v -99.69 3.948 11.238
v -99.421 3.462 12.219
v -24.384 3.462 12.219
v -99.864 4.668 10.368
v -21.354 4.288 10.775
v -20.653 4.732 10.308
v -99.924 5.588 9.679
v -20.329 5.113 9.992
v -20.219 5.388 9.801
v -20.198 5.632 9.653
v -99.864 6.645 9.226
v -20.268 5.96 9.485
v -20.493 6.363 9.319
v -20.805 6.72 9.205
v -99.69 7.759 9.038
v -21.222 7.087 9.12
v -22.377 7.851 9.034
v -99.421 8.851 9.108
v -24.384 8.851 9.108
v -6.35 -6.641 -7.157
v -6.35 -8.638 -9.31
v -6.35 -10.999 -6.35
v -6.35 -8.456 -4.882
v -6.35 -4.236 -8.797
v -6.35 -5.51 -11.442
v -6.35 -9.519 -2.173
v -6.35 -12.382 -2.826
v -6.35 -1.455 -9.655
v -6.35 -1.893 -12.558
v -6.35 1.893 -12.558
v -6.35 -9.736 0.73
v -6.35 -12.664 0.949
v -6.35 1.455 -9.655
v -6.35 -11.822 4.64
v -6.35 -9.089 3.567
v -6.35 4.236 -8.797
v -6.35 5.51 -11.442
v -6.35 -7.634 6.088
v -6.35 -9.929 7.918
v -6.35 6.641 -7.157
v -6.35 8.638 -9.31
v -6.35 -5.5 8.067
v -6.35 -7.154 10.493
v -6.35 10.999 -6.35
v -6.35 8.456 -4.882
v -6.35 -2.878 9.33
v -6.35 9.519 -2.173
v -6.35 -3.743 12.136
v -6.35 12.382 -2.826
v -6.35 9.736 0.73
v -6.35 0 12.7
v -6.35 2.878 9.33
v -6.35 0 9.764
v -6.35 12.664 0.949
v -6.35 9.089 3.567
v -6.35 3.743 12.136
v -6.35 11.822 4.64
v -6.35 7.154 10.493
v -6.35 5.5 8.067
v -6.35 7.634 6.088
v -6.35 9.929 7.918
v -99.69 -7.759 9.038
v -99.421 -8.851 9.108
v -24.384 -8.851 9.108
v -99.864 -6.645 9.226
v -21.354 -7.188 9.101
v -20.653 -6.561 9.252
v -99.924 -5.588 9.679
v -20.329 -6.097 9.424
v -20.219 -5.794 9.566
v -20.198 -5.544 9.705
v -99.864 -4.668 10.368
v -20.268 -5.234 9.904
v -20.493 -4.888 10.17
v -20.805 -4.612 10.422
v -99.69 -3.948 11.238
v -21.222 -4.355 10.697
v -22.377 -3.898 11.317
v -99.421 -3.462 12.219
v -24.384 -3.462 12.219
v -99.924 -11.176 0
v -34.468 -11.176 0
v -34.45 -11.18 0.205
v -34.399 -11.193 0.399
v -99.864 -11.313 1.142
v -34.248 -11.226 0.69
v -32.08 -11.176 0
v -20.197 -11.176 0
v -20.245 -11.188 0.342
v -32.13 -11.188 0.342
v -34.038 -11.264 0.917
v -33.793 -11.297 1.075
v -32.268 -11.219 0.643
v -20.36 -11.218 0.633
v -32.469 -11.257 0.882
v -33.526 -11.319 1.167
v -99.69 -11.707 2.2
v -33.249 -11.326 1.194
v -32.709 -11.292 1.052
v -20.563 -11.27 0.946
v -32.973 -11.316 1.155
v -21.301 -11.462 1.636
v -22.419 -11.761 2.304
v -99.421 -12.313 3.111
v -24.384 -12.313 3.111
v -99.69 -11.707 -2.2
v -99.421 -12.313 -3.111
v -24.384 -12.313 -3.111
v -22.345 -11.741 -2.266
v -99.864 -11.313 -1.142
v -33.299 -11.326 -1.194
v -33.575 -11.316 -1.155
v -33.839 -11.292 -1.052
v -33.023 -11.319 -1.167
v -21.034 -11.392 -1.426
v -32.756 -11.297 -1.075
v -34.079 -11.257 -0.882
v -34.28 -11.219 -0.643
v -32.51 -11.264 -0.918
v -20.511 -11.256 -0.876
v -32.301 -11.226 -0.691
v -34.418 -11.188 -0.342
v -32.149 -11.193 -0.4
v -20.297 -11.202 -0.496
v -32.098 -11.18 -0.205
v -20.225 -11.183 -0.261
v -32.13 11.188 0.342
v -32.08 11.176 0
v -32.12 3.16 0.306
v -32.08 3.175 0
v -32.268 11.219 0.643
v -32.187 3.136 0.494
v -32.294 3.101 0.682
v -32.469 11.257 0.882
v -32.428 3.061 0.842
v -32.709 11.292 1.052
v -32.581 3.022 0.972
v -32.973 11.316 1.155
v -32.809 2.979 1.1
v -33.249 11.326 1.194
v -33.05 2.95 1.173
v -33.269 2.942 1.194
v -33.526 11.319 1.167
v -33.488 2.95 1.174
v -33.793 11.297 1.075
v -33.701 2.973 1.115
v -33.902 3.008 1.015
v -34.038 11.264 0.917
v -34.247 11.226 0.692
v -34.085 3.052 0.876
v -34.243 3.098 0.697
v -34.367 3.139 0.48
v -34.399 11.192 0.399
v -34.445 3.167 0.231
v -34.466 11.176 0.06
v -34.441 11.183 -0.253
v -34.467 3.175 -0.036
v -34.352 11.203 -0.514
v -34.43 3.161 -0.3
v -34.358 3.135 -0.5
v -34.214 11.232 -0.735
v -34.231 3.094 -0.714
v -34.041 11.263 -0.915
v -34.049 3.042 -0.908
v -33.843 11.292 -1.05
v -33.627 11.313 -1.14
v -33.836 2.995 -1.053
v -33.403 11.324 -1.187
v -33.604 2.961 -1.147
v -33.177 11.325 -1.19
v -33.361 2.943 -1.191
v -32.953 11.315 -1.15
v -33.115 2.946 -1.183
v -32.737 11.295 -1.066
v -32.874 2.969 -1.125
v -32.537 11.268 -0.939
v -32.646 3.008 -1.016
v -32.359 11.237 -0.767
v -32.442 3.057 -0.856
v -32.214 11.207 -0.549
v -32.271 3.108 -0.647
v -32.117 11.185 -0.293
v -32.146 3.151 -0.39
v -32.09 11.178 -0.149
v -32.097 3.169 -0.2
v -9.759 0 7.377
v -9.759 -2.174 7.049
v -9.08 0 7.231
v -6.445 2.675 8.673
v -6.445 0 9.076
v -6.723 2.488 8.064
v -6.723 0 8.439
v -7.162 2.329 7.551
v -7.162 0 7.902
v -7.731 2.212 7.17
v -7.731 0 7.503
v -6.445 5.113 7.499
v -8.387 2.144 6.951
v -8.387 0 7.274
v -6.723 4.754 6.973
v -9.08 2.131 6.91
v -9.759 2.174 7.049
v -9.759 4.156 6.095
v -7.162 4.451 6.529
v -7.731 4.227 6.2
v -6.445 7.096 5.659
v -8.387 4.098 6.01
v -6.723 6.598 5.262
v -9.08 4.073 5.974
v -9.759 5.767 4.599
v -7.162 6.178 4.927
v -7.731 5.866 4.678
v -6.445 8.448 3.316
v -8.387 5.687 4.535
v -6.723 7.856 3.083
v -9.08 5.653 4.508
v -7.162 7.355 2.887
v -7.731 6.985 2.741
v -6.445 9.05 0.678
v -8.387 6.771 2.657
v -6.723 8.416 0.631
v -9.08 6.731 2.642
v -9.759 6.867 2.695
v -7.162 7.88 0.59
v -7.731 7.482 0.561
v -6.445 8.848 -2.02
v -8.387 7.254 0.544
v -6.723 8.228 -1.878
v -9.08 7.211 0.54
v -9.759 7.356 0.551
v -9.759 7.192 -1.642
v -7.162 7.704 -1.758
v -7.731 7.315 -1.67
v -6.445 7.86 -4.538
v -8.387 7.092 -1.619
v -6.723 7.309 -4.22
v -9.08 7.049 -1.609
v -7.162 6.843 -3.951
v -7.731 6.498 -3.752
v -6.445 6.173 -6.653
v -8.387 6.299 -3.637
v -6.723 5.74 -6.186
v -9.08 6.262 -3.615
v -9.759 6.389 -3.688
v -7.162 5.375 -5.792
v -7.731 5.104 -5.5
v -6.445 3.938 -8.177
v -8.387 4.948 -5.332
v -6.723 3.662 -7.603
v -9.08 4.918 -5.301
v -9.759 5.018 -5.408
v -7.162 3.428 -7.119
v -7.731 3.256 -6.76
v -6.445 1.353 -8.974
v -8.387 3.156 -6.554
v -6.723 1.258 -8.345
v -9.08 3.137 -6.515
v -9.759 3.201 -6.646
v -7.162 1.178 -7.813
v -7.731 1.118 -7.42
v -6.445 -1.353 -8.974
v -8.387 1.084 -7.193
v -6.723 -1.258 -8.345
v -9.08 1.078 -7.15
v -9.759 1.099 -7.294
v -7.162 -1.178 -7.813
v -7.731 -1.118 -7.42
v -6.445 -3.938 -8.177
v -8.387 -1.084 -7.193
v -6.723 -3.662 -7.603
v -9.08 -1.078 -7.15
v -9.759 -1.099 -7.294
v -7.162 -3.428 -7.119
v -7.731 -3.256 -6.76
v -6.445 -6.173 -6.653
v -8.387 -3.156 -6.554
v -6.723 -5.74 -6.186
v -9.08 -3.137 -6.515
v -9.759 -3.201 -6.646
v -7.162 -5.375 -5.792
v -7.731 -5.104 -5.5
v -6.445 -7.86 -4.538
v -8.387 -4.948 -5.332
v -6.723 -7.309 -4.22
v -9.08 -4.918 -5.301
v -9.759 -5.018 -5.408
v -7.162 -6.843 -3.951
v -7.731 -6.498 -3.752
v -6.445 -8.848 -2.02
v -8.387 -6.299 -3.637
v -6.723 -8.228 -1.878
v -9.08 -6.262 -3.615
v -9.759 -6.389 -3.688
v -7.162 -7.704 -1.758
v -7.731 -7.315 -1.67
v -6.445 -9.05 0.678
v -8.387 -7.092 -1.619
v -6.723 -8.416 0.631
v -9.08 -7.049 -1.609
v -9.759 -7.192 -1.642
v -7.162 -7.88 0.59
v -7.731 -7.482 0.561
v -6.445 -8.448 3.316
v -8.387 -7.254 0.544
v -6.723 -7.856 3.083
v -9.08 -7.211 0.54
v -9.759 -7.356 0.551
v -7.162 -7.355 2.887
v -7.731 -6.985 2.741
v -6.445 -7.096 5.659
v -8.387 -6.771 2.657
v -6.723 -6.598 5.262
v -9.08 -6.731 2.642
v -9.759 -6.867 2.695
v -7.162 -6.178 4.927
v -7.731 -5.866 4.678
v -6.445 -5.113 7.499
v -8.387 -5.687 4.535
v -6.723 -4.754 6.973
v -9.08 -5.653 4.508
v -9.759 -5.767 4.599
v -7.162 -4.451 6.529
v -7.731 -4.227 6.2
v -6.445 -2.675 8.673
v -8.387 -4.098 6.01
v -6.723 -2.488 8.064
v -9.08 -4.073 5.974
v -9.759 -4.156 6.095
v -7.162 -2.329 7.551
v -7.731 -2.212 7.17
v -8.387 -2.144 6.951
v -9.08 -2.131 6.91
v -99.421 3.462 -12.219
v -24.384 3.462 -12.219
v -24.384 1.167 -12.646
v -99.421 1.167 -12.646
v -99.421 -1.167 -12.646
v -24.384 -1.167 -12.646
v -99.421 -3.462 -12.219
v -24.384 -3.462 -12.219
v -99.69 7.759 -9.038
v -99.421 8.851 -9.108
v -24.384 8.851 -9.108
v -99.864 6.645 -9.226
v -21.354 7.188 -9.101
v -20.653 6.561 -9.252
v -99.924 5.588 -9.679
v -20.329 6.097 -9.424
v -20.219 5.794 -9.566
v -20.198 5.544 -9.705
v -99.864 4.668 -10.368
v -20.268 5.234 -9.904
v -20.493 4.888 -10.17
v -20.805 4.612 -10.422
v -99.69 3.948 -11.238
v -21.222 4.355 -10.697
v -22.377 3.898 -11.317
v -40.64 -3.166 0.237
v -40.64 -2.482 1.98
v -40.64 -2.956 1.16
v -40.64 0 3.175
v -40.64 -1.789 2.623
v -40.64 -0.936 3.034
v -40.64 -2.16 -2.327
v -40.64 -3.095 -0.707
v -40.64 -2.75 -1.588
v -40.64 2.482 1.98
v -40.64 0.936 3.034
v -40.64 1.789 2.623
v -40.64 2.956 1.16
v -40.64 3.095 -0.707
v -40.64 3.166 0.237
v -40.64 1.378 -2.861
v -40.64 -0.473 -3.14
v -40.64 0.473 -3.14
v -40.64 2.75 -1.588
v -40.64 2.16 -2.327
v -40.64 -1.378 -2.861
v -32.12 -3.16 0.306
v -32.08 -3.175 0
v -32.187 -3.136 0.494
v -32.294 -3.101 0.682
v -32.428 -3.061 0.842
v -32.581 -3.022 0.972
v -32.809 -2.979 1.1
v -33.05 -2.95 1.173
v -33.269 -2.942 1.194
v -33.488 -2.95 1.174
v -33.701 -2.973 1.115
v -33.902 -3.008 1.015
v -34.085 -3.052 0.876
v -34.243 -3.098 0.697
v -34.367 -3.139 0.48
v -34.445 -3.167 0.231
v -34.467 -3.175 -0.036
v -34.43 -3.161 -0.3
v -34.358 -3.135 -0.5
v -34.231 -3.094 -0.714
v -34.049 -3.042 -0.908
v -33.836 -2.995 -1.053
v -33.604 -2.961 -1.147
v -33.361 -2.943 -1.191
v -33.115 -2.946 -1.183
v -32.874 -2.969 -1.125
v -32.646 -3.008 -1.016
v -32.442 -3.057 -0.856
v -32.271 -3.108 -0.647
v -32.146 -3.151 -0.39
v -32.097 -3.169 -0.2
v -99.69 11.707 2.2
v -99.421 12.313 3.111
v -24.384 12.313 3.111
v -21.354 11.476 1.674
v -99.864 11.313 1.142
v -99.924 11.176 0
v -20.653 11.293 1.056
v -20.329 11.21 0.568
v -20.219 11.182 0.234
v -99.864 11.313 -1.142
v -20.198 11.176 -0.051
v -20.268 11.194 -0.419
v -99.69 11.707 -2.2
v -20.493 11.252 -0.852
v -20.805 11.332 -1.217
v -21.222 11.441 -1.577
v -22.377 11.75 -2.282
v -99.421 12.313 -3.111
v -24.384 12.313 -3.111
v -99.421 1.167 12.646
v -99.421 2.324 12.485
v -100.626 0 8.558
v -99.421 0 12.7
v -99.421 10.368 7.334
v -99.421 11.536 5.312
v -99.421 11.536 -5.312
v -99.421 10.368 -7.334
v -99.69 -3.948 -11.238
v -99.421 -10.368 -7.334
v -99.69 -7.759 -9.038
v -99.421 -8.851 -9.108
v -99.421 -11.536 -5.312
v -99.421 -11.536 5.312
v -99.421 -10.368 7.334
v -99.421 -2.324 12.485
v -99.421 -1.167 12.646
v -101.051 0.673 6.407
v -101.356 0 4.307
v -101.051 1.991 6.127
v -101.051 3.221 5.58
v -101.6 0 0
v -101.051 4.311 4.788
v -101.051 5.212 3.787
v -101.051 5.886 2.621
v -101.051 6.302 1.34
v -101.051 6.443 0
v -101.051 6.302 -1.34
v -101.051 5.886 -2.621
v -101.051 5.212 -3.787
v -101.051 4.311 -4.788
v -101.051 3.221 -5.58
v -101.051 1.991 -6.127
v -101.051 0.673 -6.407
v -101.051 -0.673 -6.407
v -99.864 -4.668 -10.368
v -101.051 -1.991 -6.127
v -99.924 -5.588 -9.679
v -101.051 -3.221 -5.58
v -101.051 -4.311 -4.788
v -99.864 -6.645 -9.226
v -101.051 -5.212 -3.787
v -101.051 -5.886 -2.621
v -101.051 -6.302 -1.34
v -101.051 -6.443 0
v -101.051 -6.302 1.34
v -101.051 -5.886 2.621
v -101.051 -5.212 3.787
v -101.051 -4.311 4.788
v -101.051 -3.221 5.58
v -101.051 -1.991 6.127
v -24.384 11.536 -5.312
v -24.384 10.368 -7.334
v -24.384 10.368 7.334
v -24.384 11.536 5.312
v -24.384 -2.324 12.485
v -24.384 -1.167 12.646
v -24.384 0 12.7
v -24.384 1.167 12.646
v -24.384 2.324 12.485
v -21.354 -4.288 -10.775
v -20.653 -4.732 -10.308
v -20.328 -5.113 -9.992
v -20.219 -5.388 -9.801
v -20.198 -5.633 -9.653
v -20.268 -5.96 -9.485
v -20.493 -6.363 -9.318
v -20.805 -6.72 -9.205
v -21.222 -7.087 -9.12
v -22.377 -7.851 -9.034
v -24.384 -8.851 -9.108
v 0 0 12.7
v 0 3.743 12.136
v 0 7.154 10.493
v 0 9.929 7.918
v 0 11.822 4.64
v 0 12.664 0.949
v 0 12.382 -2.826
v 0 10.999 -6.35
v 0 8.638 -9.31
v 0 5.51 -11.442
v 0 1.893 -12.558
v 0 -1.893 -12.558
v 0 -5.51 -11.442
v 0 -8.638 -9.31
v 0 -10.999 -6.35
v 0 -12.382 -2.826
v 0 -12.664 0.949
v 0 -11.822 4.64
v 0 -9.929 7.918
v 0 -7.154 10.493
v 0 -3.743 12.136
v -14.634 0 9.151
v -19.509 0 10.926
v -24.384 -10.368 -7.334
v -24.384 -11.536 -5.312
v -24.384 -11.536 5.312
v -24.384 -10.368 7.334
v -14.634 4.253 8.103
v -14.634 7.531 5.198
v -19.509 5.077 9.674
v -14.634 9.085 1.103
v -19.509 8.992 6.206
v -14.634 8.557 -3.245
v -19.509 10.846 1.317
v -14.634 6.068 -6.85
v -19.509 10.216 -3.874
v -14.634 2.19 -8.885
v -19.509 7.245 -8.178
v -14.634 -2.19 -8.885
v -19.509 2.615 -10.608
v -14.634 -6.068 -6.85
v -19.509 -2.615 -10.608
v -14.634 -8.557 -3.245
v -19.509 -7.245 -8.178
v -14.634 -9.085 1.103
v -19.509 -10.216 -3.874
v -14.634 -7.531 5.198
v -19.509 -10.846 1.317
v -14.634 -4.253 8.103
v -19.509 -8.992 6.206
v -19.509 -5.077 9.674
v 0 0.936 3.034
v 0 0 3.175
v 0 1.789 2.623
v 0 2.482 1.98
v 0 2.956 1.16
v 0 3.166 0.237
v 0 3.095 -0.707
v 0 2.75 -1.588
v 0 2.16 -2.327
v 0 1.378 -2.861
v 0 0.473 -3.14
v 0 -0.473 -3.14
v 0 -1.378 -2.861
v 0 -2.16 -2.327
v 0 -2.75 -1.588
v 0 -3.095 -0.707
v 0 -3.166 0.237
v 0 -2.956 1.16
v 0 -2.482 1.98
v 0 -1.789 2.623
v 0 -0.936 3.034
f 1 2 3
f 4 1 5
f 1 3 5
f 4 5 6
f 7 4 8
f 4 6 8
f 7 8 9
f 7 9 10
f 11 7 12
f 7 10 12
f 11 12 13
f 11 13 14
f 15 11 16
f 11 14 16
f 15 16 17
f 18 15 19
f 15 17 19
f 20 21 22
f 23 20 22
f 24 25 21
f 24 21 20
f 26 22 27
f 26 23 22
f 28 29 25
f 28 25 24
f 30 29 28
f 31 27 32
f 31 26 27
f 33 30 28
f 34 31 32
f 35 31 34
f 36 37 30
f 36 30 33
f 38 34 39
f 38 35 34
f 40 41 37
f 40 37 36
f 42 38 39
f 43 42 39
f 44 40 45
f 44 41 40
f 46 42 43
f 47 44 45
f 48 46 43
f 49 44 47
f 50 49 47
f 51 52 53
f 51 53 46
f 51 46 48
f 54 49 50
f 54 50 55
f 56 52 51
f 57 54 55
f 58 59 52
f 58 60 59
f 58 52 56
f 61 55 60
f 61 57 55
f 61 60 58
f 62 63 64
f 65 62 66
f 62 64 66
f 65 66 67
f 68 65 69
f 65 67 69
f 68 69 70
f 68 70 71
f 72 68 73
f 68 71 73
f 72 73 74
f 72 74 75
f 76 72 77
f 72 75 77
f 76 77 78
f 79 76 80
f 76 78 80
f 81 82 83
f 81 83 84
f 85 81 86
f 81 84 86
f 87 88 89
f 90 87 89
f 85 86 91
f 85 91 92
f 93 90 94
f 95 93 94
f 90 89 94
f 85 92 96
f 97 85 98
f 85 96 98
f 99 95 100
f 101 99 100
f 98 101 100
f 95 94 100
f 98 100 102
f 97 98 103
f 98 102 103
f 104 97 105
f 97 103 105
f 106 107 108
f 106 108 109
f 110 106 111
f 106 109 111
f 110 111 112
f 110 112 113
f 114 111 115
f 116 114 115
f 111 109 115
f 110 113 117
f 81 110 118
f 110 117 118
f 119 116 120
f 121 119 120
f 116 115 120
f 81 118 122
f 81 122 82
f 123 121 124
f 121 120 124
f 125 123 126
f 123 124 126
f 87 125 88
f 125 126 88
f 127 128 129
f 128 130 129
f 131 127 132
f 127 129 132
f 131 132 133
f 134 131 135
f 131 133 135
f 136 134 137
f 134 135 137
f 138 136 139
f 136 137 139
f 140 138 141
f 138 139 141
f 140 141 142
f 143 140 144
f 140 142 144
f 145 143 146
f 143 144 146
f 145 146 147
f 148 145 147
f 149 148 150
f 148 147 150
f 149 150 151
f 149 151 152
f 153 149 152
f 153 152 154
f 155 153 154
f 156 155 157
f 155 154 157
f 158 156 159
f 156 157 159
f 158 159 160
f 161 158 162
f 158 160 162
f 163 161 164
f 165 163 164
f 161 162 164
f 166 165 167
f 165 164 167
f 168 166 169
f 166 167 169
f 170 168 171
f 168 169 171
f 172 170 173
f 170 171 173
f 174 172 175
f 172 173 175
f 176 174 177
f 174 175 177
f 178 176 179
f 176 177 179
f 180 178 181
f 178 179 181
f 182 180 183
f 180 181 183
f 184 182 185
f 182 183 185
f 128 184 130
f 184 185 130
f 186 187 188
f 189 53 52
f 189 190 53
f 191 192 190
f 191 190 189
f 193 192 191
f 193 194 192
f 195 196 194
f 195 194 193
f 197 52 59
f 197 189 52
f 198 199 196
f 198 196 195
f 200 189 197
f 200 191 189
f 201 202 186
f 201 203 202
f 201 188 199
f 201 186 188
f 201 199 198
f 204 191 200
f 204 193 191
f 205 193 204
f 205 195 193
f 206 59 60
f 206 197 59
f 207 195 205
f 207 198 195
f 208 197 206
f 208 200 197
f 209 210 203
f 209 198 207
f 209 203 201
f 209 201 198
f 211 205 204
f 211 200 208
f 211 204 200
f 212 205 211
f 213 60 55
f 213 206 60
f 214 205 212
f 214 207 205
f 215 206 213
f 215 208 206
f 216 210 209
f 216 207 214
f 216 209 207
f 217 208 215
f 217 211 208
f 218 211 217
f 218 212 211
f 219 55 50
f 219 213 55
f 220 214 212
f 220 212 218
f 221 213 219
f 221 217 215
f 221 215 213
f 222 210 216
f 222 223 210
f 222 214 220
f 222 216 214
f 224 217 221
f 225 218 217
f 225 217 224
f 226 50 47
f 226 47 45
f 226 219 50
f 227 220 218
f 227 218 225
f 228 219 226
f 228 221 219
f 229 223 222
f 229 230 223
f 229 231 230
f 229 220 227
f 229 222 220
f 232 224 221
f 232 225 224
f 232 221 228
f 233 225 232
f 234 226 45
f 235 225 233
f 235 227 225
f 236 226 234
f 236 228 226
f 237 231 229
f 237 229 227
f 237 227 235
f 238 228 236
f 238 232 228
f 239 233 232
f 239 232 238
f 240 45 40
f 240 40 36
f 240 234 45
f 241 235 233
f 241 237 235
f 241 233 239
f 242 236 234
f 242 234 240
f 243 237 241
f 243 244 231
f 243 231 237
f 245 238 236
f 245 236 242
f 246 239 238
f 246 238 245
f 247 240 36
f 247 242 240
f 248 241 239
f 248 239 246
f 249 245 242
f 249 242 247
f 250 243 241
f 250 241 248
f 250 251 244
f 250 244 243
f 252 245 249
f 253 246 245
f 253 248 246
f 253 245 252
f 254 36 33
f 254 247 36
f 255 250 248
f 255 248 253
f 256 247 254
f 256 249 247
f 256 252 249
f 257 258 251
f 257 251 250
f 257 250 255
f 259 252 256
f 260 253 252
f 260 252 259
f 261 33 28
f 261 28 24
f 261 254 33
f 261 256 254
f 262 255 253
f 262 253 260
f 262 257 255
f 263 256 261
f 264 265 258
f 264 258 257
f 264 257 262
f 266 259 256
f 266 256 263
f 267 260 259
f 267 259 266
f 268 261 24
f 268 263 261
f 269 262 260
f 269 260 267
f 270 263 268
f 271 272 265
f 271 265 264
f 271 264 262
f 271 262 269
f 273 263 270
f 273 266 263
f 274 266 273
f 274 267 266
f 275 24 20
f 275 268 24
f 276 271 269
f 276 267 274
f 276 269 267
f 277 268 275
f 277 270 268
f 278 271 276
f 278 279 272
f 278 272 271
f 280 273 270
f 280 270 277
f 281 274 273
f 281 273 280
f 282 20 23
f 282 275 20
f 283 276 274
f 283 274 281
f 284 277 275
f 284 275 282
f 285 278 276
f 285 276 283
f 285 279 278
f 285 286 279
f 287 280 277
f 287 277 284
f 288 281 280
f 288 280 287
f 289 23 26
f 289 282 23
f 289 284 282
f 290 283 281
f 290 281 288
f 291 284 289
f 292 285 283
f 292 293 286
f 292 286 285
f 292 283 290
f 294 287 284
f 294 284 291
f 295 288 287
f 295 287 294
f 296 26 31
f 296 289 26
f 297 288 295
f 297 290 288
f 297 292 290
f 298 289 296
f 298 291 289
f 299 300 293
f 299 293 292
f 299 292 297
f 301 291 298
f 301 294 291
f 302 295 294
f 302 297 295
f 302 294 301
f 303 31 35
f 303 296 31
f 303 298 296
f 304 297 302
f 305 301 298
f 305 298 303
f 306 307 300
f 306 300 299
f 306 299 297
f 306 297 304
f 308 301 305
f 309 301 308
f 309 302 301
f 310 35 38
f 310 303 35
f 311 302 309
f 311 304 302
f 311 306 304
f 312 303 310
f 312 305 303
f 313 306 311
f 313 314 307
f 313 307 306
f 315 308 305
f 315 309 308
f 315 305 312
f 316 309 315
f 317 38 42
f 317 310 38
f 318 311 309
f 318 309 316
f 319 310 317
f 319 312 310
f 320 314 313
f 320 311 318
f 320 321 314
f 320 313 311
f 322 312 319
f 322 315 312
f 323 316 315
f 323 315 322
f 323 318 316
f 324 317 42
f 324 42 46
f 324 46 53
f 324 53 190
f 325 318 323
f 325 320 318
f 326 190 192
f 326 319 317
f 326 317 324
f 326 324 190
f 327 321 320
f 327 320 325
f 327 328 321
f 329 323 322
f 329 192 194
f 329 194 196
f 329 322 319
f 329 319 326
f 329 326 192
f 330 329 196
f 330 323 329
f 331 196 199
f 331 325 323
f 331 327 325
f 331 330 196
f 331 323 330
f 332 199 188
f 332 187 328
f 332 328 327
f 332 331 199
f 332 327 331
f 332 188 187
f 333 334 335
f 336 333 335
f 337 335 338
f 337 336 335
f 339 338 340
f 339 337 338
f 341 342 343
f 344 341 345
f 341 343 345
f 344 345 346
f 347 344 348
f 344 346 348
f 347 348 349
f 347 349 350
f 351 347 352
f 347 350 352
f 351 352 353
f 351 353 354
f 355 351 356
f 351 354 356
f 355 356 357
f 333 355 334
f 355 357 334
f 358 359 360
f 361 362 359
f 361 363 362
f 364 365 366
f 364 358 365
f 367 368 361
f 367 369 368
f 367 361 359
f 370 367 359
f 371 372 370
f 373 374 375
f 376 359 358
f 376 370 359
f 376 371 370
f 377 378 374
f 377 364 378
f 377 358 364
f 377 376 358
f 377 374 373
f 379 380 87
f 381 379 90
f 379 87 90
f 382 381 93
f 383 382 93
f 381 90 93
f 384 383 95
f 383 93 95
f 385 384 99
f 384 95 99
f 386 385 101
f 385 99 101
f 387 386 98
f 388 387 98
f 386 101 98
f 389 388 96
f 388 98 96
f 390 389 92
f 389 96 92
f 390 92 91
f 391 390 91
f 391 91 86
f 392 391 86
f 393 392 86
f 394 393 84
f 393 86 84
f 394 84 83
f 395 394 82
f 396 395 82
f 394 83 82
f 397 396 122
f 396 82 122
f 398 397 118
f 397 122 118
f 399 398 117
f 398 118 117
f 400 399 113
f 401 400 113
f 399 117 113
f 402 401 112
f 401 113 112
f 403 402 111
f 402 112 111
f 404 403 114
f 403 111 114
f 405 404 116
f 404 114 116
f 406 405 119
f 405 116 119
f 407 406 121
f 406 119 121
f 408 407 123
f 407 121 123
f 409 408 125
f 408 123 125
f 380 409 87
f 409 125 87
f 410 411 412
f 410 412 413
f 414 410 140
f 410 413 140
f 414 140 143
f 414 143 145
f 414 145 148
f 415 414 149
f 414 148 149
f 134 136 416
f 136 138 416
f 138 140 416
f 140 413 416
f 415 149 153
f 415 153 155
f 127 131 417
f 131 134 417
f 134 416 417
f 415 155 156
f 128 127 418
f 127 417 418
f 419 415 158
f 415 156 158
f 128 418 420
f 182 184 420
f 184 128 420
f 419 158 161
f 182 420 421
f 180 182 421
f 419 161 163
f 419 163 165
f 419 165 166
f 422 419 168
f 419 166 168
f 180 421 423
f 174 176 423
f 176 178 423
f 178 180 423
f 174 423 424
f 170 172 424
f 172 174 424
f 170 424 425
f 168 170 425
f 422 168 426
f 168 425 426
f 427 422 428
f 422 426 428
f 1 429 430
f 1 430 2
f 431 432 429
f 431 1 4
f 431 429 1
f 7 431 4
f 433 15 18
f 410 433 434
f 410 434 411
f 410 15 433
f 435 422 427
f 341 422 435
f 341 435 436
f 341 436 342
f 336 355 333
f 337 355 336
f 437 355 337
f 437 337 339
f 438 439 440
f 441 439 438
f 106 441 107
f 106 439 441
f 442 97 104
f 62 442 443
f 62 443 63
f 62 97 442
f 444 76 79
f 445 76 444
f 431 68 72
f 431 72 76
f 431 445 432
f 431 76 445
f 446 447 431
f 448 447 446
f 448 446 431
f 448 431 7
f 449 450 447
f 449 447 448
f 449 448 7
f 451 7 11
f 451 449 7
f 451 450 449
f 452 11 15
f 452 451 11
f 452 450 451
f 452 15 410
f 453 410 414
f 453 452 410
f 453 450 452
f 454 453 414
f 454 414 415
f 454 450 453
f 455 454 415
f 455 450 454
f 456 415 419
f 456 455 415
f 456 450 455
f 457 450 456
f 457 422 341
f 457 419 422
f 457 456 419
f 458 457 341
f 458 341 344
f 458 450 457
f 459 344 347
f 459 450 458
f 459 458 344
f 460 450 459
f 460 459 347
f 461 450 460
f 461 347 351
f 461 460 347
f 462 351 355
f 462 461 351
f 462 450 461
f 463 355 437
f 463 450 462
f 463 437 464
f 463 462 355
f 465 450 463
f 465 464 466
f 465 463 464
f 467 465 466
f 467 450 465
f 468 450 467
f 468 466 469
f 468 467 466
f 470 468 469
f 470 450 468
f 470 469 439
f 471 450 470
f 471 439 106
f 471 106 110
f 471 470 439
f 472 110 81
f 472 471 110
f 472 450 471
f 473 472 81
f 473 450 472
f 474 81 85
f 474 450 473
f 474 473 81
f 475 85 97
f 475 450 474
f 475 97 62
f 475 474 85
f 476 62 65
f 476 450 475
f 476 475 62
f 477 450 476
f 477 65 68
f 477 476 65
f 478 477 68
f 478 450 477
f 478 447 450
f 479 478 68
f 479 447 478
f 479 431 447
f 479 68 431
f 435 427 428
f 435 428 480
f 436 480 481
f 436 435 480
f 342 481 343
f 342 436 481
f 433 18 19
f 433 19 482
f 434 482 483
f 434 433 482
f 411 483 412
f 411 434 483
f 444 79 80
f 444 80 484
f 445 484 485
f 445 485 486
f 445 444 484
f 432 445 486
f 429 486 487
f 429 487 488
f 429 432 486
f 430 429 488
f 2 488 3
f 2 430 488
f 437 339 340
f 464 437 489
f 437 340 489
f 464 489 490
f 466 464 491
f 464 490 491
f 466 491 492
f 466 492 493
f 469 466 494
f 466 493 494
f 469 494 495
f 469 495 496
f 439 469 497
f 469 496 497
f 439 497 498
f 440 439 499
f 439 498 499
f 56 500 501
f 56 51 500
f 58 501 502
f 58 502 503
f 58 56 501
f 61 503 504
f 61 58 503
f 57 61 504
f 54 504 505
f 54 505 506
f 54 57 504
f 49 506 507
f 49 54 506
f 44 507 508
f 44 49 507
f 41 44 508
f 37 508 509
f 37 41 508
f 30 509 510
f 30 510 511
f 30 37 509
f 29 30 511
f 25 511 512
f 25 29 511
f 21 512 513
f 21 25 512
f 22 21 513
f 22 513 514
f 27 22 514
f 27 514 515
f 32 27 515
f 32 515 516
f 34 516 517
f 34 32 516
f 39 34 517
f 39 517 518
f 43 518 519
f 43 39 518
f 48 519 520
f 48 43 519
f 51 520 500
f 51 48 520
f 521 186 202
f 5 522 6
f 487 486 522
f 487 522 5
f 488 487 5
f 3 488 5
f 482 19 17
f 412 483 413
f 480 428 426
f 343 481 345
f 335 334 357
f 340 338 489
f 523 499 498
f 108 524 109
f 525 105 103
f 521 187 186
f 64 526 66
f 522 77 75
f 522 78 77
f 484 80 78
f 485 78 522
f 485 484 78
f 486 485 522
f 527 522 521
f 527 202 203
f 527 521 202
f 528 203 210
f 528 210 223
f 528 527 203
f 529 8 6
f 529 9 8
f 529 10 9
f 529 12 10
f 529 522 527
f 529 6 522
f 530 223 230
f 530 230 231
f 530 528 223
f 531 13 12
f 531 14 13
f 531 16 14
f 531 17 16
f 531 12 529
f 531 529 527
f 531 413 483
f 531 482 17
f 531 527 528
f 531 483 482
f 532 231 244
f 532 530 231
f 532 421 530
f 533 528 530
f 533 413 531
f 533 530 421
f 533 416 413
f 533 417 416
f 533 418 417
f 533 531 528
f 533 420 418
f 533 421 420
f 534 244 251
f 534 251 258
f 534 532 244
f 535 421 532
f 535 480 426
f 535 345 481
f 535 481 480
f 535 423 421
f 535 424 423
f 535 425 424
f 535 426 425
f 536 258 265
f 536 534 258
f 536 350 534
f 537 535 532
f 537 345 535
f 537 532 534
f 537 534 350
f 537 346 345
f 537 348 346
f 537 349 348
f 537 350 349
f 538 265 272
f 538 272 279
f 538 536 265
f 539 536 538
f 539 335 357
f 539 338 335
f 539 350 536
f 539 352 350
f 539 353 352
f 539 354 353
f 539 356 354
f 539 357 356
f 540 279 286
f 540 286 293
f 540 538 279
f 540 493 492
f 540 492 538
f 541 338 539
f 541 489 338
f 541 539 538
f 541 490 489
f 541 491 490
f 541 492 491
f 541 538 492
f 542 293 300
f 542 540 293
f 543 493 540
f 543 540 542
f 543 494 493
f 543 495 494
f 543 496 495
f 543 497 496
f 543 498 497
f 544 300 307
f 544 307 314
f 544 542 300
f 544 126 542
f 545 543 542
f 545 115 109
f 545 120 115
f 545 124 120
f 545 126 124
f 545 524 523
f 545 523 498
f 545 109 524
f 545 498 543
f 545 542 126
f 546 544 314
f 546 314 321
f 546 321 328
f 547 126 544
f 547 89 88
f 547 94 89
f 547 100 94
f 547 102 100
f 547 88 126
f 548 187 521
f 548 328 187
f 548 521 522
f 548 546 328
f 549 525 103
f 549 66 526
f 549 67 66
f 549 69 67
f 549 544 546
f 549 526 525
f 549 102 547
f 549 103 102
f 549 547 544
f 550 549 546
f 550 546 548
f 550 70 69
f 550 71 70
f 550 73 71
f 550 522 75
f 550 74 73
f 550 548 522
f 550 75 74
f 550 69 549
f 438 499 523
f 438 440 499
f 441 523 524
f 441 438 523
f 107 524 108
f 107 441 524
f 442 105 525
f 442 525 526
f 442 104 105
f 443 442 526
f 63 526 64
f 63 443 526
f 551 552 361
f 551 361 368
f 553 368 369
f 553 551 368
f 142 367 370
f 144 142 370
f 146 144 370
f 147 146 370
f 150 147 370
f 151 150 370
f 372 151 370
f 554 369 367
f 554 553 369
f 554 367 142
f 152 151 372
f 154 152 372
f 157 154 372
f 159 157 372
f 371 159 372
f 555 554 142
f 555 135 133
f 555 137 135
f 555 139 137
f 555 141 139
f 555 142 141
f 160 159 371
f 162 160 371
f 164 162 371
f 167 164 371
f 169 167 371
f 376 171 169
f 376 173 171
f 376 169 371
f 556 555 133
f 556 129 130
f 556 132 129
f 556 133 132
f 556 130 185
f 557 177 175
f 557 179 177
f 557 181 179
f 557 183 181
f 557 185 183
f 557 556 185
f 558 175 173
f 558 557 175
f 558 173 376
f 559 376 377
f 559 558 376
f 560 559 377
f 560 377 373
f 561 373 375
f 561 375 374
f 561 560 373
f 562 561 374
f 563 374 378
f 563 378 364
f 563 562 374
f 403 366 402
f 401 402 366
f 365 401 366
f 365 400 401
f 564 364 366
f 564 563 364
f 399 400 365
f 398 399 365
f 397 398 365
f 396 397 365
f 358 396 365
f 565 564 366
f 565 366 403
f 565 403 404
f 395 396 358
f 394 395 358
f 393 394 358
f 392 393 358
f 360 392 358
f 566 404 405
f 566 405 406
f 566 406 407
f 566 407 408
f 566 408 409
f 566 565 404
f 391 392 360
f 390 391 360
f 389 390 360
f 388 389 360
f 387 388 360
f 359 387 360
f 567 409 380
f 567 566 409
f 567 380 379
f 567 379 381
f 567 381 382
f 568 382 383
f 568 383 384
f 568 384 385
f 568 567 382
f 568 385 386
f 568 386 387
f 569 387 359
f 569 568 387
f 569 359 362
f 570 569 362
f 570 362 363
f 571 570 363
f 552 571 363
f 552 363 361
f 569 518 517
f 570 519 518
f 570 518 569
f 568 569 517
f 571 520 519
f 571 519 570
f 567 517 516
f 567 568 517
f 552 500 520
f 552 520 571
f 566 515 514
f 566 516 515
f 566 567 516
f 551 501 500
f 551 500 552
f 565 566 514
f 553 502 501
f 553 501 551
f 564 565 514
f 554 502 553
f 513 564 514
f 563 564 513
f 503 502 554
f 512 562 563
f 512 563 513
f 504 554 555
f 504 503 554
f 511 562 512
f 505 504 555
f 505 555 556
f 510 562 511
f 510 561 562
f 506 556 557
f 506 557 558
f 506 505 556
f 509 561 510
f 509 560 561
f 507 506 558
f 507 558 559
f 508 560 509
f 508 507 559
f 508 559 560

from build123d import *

# Parameters (mm, degrees)
F4_START = -7.62
F4_DEPTH = 93.981
F5_R     = 1.1938
F6_DEPTH = 12.7


with BuildPart() as f1:
    # F0 (on Front) → F1 (revolve)
    with BuildSketch(Plane.XZ):
        with BuildLine():
            Line((-40.64, 3.175), (0, 3.175))
            Line((0, 3.175), (0, 12.7))
            Line((0, 12.7), (-6.35, 12.7))
            Line((-6.35, 12.7), (-6.35, 9.7636567324))
            ThreePointArc((-6.35, 9.7636567324), (-7.4331158517, 7.6830105399), (-9.758731164, 7.3768374756))
            Line((-9.758731164, 7.3768374756), (-24.384, 12.7))
            Line((-24.384, 12.7), (-99.4210244843, 12.7))
            ThreePointArc((-99.4210244843, 12.7), (-101.0513051228, 6.4427853895), (-101.6, 0))
            Line((-101.6, 0), (-40.64, 0))
            Line((-40.64, 0), (-40.64, 3.175))
        make_face()
    revolve(axis=Axis((-71.12, 0, 0), (-1, 0, 0)))

    # F2 (on Right) → F4 (cut)
    with BuildSketch(Plane.YZ.offset(F4_START)):
        with BuildLine():
            ThreePointArc((-3.175, 13.8581385114), (-3.2583413998, 14.751147695), (-3.5054871123, 15.6133136811))
            ThreePointArc((-3.5054871123, 15.6133136811), (-8.001, 13.8581385114), (-11.768782729, 10.8424977325))
            ThreePointArc((-11.768782729, 10.8424977325), (-6.4030393387, 9.3043710903), (-3.175, 13.8581385114))
        make_face()
        with BuildLine():
            ThreePointArc((3.5054871123, 15.6133136811), (5.588, 9.6786999127), (11.768782729, 10.8424977325))
            ThreePointArc((11.768782729, 10.8424977325), (8.001, 13.8581385114), (3.5054871123, 15.6133136811))
        make_face()
        with BuildLine():
            ThreePointArc((15.2742698413, -4.7708159487), (15.8190213035, -2.413), (16.002, 0))
            ThreePointArc((16.002, 0), (15.8190213035, 2.413), (15.2742698413, 4.7708159487))
            ThreePointArc((15.2742698413, 4.7708159487), (11.176, 0), (15.2742698413, -4.7708159487))
        make_face()
        with BuildLine():
            ThreePointArc((3.5054871123, -15.6133136811), (8.001, -13.8581385114), (11.768782729, -10.8424977325))
            ThreePointArc((11.768782729, -10.8424977325), (5.588, -9.6786999127), (3.5054871123, -15.6133136811))
        make_face()
        with BuildLine():
            ThreePointArc((-11.768782729, -10.8424977325), (-8.001, -13.8581385114), (-3.5054871123, -15.6133136811))
            ThreePointArc((-3.5054871123, -15.6133136811), (-3.2583413998, -14.751147695), (-3.175, -13.8581385114))
            ThreePointArc((-3.175, -13.8581385114), (-6.4030393387, -9.3043710903), (-11.768782729, -10.8424977325))
        make_face()
        with BuildLine():
            ThreePointArc((-11.176, 0), (-12.3412417626, 3.1446979389), (-15.2742698413, 4.7708159487))
            ThreePointArc((-15.2742698413, 4.7708159487), (-16.002, 0), (-15.2742698413, -4.7708159487))
            ThreePointArc((-15.2742698413, -4.7708159487), (-12.3412417626, -3.1446979389), (-11.176, 0))
        make_face()
    extrude(amount=-F4_DEPTH, mode=Mode.SUBTRACT)

    # F5 (on Front) → F6 (cut, symmetric)
    with BuildSketch(Plane.XZ):
        with Locations((-33.274, 0)):
            Circle(F5_R)
    extrude(amount=F6_DEPTH, both=True, mode=Mode.SUBTRACT)


solid = f1.part
